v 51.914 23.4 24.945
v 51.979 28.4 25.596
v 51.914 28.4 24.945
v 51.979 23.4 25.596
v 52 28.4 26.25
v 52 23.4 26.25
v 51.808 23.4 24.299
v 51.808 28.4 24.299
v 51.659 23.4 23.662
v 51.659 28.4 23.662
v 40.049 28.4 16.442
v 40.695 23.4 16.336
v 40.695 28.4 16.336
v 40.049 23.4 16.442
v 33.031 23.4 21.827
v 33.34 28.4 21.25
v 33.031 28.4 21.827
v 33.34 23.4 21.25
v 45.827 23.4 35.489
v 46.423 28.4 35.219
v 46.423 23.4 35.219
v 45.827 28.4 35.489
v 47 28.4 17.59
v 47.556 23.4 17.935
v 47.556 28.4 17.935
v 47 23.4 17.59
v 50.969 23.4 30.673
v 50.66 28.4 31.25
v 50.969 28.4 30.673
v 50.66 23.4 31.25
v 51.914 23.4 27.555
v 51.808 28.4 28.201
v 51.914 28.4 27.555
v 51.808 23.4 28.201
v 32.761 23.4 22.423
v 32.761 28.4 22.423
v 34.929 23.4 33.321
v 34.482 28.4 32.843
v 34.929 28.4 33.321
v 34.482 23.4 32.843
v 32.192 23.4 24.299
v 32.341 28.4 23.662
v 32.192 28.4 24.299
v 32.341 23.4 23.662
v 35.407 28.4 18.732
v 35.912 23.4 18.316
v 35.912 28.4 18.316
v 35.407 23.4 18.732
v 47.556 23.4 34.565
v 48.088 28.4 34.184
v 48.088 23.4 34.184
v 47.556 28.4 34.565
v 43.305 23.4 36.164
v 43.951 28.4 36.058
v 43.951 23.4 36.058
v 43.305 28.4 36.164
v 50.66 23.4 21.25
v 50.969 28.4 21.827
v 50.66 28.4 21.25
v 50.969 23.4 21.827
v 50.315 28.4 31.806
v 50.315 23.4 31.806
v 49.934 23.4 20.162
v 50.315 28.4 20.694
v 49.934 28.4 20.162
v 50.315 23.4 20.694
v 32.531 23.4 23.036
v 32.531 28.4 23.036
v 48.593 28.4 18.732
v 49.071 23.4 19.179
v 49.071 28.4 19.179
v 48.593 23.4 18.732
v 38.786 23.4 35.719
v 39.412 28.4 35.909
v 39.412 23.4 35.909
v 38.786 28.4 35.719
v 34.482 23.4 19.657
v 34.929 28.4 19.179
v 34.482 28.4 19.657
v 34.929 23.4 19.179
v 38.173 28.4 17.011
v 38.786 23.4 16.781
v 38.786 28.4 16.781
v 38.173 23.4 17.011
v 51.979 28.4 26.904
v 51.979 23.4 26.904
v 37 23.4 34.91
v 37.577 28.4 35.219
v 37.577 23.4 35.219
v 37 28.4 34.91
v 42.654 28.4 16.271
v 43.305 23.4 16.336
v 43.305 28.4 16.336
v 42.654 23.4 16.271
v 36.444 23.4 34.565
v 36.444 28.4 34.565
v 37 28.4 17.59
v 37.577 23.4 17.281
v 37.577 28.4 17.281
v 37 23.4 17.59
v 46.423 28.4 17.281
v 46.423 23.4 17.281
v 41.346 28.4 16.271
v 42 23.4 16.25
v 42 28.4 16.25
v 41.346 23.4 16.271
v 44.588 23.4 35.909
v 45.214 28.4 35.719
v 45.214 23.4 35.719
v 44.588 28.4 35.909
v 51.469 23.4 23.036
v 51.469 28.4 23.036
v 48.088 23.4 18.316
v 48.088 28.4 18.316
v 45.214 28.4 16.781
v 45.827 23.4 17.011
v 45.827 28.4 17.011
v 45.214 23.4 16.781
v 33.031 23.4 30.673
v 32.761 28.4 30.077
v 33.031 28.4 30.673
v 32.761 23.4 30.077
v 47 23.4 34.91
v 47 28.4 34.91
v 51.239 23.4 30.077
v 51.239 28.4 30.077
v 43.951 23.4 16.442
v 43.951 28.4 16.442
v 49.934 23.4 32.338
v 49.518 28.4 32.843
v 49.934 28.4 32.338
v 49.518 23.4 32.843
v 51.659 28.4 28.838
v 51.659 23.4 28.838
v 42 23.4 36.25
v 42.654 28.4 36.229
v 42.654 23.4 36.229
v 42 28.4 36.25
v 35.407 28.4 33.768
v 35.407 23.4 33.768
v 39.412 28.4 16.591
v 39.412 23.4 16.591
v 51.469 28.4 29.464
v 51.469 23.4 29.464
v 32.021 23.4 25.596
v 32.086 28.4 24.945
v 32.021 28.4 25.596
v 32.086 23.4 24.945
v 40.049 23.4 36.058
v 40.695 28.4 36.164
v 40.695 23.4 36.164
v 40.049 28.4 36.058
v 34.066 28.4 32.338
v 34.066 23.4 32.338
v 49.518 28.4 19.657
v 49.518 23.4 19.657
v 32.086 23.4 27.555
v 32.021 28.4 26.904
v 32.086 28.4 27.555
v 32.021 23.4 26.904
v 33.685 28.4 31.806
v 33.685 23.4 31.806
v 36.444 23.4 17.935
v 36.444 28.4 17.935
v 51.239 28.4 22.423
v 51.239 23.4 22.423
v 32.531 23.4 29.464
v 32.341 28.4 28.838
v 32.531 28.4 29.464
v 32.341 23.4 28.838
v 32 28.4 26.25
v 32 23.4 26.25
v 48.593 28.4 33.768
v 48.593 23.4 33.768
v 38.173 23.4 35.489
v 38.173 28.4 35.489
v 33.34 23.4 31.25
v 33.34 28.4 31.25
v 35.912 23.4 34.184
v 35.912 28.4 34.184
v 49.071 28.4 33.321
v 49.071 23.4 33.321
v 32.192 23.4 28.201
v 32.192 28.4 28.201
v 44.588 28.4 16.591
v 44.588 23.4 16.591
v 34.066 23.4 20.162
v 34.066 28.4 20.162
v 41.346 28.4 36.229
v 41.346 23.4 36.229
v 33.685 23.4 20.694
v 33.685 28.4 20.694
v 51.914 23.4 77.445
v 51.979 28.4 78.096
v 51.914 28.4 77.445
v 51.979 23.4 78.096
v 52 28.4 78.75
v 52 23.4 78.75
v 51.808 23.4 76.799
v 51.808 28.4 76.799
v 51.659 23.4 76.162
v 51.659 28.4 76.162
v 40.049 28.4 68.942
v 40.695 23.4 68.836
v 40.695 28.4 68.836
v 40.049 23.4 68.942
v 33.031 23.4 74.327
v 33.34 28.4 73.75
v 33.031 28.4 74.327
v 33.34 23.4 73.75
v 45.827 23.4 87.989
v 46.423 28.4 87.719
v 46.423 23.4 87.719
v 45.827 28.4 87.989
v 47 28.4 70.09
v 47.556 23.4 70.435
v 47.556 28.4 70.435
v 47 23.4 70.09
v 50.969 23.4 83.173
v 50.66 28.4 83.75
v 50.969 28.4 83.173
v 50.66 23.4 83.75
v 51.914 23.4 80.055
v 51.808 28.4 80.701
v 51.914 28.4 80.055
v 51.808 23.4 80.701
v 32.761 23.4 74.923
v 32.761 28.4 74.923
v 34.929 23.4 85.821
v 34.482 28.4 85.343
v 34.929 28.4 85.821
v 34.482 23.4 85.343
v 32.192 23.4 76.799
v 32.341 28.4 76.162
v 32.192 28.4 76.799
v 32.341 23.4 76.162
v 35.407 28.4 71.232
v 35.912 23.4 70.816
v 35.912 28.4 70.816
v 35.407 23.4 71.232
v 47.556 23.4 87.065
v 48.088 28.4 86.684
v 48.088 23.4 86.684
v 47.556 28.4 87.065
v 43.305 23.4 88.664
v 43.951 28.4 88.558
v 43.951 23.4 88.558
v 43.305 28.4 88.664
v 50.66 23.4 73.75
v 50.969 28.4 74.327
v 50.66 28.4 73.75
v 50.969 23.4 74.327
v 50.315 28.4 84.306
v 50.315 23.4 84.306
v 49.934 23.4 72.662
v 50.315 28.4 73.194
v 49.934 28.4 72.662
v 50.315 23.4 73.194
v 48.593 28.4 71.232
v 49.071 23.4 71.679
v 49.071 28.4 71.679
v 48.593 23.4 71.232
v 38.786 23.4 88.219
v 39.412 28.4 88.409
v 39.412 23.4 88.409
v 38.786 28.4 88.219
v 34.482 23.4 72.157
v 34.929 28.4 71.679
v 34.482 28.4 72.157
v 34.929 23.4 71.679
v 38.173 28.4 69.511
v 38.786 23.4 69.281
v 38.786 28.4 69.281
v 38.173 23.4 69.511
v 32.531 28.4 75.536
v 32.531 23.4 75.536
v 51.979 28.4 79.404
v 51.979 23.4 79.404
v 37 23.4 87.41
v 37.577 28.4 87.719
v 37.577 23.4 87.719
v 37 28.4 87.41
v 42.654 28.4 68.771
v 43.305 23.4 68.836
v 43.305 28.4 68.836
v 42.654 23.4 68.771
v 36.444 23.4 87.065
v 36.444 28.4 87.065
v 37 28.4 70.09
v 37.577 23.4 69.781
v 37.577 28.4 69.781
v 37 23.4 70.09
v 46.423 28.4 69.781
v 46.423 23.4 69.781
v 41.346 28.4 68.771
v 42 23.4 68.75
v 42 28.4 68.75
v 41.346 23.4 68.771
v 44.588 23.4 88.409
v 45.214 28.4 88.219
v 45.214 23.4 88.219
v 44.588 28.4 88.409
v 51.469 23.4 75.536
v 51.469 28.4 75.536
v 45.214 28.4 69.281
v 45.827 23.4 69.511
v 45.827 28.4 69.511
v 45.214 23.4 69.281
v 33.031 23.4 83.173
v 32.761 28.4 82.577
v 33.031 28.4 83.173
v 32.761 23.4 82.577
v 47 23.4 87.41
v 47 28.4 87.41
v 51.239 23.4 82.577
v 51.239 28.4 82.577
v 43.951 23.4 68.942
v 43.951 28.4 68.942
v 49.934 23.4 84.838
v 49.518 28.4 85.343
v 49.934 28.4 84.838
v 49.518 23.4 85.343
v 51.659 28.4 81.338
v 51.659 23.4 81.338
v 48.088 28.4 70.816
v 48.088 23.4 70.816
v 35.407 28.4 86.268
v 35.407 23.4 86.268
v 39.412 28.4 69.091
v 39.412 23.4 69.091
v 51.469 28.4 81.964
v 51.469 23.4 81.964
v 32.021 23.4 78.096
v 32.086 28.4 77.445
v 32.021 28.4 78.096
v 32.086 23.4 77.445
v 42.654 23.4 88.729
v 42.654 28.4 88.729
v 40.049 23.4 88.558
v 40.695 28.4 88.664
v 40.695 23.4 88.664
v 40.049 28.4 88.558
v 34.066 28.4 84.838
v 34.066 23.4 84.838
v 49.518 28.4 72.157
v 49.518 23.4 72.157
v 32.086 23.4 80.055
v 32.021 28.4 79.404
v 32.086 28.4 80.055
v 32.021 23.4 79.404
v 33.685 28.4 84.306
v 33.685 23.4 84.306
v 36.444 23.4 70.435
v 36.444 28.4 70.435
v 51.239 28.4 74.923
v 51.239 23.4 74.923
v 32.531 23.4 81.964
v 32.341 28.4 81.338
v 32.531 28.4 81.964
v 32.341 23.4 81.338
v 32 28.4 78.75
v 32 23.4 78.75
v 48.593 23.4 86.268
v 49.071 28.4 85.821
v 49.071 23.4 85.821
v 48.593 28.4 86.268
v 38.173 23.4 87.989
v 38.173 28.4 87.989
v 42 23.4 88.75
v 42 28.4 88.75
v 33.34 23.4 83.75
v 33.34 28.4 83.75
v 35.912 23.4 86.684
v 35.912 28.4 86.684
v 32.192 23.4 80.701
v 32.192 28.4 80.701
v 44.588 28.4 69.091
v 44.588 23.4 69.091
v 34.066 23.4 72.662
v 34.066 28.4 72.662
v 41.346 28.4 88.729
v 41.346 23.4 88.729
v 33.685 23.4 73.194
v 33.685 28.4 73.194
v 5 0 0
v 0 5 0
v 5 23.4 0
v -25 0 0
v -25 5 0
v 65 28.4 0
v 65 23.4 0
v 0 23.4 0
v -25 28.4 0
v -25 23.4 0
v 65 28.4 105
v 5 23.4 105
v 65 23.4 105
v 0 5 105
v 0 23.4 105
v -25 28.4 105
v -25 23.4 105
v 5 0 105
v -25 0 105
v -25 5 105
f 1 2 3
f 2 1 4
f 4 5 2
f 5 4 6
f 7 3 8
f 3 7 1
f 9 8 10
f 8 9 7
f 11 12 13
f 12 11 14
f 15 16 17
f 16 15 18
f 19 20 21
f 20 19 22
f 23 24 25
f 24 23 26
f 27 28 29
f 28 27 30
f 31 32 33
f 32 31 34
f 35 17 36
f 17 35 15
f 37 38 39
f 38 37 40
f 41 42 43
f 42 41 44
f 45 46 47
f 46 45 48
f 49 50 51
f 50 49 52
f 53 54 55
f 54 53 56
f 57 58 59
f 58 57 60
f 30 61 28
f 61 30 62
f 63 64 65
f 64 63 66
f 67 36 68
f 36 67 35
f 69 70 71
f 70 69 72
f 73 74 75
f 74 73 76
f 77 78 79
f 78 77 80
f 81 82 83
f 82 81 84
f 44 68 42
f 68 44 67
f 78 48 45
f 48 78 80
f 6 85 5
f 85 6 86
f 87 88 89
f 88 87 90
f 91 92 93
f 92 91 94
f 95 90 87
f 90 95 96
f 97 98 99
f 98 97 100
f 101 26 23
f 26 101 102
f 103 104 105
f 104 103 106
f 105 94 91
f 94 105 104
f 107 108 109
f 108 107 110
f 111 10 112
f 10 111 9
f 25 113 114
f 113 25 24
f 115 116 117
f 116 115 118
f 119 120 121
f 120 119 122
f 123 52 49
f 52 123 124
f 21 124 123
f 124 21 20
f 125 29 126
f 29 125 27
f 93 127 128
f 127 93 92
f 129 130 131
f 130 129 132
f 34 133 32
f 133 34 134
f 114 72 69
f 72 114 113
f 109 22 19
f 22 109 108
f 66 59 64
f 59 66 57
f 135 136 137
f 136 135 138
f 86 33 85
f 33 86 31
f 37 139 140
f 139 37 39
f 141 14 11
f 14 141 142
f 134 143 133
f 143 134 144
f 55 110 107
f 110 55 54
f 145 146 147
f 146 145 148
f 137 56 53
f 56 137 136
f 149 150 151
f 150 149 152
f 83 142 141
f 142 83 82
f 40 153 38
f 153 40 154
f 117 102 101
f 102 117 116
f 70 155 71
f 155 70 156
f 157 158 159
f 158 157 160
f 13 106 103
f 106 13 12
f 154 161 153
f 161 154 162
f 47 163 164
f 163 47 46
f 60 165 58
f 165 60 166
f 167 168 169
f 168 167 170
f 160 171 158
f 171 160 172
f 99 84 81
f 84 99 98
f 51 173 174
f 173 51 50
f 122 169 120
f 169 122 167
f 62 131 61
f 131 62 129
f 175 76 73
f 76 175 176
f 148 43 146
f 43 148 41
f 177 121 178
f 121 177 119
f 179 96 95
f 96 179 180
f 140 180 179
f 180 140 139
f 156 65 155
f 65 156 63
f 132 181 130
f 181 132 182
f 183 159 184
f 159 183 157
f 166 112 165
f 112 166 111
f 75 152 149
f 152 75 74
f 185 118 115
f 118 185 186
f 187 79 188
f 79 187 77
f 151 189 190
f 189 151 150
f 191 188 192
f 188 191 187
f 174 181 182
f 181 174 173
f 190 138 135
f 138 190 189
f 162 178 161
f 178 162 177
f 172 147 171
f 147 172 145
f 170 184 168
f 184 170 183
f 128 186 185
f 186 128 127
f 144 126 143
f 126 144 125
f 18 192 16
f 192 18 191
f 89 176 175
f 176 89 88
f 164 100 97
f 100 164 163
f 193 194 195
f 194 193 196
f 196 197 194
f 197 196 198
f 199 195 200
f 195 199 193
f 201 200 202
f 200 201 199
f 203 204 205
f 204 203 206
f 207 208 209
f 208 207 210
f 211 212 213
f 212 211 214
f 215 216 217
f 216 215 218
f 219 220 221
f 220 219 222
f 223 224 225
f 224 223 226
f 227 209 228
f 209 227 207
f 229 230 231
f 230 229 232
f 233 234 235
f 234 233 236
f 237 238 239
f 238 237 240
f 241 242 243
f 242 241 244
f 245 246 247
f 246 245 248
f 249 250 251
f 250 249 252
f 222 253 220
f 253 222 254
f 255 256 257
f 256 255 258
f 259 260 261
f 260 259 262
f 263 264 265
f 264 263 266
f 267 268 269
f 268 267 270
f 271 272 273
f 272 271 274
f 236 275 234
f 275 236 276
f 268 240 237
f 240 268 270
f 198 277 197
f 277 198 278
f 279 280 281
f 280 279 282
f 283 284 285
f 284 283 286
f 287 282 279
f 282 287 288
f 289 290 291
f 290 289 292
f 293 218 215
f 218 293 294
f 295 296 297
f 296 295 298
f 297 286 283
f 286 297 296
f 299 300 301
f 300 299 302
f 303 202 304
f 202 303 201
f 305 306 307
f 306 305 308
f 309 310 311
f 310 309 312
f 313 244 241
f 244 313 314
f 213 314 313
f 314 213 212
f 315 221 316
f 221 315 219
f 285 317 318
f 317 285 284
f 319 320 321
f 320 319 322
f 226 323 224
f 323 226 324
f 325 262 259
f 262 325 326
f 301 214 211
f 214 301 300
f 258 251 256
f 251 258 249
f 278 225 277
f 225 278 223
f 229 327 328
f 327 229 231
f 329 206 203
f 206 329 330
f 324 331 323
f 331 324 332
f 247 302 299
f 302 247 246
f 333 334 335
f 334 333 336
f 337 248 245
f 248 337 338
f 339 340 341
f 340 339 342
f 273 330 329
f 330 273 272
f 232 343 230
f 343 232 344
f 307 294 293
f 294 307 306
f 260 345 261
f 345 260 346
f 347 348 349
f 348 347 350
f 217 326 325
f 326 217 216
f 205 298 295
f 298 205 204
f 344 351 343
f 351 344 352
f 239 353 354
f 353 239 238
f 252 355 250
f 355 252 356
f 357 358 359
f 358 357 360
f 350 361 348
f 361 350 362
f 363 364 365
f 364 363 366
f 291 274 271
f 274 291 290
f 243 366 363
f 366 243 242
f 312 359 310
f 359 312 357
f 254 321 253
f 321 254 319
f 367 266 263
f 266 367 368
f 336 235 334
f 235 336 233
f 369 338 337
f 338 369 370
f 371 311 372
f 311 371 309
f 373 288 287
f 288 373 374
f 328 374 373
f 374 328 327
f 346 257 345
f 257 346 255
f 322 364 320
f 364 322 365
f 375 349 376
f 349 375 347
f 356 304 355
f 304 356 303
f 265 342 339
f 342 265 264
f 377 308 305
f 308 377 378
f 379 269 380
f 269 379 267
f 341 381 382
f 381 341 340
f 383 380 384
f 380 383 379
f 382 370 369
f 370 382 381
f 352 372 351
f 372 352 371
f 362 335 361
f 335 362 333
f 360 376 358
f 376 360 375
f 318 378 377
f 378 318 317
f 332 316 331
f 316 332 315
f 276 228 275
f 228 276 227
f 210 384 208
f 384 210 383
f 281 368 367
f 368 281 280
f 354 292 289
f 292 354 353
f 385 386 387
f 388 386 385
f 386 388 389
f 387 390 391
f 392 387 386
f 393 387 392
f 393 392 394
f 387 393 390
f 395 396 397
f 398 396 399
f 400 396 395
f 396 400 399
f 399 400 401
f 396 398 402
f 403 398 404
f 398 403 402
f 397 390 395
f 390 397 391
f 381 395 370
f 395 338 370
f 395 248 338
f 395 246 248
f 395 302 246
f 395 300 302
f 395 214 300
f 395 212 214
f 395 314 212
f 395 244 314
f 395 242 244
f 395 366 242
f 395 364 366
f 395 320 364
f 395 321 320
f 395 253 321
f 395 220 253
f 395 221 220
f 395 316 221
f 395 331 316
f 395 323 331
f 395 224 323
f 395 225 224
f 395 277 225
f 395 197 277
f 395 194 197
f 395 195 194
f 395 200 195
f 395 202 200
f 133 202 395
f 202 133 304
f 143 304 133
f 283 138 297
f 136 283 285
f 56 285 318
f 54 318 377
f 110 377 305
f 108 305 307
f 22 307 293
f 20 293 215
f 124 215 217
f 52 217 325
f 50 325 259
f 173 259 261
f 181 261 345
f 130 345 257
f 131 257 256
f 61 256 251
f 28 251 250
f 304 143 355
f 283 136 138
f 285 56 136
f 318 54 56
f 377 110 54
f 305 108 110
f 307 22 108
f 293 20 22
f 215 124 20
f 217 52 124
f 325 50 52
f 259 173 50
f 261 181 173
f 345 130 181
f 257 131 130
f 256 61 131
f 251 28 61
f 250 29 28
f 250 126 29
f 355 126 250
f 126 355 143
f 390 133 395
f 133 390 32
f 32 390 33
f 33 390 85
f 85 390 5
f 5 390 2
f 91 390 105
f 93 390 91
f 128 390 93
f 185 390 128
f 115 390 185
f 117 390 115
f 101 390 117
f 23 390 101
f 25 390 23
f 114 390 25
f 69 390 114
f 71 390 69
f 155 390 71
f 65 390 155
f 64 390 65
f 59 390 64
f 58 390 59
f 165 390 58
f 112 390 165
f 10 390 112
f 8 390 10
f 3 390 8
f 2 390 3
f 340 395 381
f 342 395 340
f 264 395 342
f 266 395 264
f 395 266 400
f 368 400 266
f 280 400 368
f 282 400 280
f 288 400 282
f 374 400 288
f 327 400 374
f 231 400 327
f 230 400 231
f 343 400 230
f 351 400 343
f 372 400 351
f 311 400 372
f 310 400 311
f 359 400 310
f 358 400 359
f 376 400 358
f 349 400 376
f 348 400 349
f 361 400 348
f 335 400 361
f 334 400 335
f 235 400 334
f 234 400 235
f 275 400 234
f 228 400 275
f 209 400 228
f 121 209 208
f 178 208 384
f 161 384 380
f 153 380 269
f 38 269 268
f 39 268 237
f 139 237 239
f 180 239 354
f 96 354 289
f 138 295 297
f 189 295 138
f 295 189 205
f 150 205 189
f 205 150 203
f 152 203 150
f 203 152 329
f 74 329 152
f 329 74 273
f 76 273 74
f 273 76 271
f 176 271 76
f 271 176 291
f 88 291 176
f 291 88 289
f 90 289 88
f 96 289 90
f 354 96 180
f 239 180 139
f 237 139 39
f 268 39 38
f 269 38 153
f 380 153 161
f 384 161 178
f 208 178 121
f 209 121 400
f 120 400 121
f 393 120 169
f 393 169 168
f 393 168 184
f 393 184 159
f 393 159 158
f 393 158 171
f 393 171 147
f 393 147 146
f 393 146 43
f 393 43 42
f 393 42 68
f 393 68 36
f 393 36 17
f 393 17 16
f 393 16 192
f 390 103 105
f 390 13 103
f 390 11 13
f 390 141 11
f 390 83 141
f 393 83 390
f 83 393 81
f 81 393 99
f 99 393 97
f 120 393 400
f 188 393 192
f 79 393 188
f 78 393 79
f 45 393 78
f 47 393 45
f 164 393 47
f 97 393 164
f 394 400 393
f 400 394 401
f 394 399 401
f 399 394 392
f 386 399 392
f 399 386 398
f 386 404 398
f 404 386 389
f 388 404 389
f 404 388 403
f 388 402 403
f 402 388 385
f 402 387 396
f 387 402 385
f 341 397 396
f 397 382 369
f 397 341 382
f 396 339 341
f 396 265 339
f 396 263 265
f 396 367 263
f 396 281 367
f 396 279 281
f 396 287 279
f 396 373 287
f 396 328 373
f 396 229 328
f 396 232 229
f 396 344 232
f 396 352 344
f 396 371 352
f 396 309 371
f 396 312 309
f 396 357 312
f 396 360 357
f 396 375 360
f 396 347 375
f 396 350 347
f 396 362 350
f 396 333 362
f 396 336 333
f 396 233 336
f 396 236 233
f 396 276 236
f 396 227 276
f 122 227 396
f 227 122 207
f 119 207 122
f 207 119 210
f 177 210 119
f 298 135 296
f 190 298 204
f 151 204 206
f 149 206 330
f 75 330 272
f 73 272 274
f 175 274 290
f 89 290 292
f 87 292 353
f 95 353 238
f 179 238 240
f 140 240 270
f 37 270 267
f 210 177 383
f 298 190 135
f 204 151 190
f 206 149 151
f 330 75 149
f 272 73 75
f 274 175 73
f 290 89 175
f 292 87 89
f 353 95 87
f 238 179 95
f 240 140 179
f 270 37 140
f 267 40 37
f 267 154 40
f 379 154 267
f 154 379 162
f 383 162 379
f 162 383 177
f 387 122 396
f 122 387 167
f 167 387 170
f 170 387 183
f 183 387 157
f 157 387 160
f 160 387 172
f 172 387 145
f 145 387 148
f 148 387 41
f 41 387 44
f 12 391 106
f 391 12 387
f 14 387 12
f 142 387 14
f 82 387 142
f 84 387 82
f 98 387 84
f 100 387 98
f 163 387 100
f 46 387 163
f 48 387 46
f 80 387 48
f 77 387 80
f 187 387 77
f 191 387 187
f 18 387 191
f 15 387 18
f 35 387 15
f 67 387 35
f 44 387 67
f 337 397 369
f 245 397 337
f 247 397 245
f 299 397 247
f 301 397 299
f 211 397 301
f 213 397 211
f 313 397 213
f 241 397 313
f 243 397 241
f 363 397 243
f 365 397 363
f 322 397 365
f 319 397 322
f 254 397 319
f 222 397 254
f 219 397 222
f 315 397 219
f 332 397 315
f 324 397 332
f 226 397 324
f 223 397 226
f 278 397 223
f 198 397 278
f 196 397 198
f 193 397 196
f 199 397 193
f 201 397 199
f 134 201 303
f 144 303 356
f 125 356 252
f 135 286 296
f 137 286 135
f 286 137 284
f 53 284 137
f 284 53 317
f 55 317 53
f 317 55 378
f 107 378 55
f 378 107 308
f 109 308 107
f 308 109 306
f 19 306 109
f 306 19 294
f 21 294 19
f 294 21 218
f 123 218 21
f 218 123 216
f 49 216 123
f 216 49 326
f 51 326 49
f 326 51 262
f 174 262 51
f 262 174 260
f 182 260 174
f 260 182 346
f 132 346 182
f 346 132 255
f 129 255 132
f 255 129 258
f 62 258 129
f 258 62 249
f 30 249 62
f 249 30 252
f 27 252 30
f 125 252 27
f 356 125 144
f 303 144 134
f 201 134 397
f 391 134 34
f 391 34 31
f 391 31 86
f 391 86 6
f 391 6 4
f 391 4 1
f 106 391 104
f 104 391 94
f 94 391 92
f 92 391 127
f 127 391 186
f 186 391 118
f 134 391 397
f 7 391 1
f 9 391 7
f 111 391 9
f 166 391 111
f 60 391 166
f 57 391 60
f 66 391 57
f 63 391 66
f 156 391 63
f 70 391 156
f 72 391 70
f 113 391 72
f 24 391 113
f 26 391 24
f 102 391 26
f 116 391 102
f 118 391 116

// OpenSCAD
// KNOWN-WRONG PART (must fail): two pipette holes instead of three
// Holder for 3 single-channel pipettes that clamps onto the front edge of an 18 mm shelf
// Category: quick fixes. A C-shaped clamp (spine, bottom jaw, top jaw) whose top jaw continues
// forward as an arm with three 20 mm holes; each pipette drops in and hangs by its handle.
// Modelled in print orientation: lying on its side, the profile in XY extruded along Z
// (in use +Y is up and +X points away from the shelf), so the jaws print as plain walls.
// Print: PETG (springier than PLA), 0.2 mm layers, 4 perimeters.
// SPDX-License-Identifier: CERN-OHL-P-2.0

/* [Holder] */
width = 105;              // extrusion length (along the shelf edge)
spine = [0, 5];           // x from, x to
jaw_back = -25;           // both jaws reach back to x = -25
jaw_t = 5;
gap = 18.4;               // 18 mm shelf + clearance
arm_front = 65;           // the top jaw continues forward to x = 65
hole_d = 20;
hole_x = 42;
hole_z = [26.25, 78.75];

/* [Hidden] */
eps = 0.01;
H = jaw_t + gap + jaw_t;  // 28.4

difference() {
    linear_extrude(width) union() {
        translate([spine[0], 0]) square([spine[1] - spine[0], H]);
        translate([jaw_back, 0]) square([spine[1] - jaw_back, jaw_t]);
        translate([jaw_back, H - jaw_t]) square([arm_front - jaw_back, jaw_t]);
    }
    for (z = hole_z)
        translate([hole_x, H - jaw_t - 1, z]) rotate([-90, 0, 0]) cylinder(d = hole_d, h = jaw_t + 2, $fn = 96);
}
